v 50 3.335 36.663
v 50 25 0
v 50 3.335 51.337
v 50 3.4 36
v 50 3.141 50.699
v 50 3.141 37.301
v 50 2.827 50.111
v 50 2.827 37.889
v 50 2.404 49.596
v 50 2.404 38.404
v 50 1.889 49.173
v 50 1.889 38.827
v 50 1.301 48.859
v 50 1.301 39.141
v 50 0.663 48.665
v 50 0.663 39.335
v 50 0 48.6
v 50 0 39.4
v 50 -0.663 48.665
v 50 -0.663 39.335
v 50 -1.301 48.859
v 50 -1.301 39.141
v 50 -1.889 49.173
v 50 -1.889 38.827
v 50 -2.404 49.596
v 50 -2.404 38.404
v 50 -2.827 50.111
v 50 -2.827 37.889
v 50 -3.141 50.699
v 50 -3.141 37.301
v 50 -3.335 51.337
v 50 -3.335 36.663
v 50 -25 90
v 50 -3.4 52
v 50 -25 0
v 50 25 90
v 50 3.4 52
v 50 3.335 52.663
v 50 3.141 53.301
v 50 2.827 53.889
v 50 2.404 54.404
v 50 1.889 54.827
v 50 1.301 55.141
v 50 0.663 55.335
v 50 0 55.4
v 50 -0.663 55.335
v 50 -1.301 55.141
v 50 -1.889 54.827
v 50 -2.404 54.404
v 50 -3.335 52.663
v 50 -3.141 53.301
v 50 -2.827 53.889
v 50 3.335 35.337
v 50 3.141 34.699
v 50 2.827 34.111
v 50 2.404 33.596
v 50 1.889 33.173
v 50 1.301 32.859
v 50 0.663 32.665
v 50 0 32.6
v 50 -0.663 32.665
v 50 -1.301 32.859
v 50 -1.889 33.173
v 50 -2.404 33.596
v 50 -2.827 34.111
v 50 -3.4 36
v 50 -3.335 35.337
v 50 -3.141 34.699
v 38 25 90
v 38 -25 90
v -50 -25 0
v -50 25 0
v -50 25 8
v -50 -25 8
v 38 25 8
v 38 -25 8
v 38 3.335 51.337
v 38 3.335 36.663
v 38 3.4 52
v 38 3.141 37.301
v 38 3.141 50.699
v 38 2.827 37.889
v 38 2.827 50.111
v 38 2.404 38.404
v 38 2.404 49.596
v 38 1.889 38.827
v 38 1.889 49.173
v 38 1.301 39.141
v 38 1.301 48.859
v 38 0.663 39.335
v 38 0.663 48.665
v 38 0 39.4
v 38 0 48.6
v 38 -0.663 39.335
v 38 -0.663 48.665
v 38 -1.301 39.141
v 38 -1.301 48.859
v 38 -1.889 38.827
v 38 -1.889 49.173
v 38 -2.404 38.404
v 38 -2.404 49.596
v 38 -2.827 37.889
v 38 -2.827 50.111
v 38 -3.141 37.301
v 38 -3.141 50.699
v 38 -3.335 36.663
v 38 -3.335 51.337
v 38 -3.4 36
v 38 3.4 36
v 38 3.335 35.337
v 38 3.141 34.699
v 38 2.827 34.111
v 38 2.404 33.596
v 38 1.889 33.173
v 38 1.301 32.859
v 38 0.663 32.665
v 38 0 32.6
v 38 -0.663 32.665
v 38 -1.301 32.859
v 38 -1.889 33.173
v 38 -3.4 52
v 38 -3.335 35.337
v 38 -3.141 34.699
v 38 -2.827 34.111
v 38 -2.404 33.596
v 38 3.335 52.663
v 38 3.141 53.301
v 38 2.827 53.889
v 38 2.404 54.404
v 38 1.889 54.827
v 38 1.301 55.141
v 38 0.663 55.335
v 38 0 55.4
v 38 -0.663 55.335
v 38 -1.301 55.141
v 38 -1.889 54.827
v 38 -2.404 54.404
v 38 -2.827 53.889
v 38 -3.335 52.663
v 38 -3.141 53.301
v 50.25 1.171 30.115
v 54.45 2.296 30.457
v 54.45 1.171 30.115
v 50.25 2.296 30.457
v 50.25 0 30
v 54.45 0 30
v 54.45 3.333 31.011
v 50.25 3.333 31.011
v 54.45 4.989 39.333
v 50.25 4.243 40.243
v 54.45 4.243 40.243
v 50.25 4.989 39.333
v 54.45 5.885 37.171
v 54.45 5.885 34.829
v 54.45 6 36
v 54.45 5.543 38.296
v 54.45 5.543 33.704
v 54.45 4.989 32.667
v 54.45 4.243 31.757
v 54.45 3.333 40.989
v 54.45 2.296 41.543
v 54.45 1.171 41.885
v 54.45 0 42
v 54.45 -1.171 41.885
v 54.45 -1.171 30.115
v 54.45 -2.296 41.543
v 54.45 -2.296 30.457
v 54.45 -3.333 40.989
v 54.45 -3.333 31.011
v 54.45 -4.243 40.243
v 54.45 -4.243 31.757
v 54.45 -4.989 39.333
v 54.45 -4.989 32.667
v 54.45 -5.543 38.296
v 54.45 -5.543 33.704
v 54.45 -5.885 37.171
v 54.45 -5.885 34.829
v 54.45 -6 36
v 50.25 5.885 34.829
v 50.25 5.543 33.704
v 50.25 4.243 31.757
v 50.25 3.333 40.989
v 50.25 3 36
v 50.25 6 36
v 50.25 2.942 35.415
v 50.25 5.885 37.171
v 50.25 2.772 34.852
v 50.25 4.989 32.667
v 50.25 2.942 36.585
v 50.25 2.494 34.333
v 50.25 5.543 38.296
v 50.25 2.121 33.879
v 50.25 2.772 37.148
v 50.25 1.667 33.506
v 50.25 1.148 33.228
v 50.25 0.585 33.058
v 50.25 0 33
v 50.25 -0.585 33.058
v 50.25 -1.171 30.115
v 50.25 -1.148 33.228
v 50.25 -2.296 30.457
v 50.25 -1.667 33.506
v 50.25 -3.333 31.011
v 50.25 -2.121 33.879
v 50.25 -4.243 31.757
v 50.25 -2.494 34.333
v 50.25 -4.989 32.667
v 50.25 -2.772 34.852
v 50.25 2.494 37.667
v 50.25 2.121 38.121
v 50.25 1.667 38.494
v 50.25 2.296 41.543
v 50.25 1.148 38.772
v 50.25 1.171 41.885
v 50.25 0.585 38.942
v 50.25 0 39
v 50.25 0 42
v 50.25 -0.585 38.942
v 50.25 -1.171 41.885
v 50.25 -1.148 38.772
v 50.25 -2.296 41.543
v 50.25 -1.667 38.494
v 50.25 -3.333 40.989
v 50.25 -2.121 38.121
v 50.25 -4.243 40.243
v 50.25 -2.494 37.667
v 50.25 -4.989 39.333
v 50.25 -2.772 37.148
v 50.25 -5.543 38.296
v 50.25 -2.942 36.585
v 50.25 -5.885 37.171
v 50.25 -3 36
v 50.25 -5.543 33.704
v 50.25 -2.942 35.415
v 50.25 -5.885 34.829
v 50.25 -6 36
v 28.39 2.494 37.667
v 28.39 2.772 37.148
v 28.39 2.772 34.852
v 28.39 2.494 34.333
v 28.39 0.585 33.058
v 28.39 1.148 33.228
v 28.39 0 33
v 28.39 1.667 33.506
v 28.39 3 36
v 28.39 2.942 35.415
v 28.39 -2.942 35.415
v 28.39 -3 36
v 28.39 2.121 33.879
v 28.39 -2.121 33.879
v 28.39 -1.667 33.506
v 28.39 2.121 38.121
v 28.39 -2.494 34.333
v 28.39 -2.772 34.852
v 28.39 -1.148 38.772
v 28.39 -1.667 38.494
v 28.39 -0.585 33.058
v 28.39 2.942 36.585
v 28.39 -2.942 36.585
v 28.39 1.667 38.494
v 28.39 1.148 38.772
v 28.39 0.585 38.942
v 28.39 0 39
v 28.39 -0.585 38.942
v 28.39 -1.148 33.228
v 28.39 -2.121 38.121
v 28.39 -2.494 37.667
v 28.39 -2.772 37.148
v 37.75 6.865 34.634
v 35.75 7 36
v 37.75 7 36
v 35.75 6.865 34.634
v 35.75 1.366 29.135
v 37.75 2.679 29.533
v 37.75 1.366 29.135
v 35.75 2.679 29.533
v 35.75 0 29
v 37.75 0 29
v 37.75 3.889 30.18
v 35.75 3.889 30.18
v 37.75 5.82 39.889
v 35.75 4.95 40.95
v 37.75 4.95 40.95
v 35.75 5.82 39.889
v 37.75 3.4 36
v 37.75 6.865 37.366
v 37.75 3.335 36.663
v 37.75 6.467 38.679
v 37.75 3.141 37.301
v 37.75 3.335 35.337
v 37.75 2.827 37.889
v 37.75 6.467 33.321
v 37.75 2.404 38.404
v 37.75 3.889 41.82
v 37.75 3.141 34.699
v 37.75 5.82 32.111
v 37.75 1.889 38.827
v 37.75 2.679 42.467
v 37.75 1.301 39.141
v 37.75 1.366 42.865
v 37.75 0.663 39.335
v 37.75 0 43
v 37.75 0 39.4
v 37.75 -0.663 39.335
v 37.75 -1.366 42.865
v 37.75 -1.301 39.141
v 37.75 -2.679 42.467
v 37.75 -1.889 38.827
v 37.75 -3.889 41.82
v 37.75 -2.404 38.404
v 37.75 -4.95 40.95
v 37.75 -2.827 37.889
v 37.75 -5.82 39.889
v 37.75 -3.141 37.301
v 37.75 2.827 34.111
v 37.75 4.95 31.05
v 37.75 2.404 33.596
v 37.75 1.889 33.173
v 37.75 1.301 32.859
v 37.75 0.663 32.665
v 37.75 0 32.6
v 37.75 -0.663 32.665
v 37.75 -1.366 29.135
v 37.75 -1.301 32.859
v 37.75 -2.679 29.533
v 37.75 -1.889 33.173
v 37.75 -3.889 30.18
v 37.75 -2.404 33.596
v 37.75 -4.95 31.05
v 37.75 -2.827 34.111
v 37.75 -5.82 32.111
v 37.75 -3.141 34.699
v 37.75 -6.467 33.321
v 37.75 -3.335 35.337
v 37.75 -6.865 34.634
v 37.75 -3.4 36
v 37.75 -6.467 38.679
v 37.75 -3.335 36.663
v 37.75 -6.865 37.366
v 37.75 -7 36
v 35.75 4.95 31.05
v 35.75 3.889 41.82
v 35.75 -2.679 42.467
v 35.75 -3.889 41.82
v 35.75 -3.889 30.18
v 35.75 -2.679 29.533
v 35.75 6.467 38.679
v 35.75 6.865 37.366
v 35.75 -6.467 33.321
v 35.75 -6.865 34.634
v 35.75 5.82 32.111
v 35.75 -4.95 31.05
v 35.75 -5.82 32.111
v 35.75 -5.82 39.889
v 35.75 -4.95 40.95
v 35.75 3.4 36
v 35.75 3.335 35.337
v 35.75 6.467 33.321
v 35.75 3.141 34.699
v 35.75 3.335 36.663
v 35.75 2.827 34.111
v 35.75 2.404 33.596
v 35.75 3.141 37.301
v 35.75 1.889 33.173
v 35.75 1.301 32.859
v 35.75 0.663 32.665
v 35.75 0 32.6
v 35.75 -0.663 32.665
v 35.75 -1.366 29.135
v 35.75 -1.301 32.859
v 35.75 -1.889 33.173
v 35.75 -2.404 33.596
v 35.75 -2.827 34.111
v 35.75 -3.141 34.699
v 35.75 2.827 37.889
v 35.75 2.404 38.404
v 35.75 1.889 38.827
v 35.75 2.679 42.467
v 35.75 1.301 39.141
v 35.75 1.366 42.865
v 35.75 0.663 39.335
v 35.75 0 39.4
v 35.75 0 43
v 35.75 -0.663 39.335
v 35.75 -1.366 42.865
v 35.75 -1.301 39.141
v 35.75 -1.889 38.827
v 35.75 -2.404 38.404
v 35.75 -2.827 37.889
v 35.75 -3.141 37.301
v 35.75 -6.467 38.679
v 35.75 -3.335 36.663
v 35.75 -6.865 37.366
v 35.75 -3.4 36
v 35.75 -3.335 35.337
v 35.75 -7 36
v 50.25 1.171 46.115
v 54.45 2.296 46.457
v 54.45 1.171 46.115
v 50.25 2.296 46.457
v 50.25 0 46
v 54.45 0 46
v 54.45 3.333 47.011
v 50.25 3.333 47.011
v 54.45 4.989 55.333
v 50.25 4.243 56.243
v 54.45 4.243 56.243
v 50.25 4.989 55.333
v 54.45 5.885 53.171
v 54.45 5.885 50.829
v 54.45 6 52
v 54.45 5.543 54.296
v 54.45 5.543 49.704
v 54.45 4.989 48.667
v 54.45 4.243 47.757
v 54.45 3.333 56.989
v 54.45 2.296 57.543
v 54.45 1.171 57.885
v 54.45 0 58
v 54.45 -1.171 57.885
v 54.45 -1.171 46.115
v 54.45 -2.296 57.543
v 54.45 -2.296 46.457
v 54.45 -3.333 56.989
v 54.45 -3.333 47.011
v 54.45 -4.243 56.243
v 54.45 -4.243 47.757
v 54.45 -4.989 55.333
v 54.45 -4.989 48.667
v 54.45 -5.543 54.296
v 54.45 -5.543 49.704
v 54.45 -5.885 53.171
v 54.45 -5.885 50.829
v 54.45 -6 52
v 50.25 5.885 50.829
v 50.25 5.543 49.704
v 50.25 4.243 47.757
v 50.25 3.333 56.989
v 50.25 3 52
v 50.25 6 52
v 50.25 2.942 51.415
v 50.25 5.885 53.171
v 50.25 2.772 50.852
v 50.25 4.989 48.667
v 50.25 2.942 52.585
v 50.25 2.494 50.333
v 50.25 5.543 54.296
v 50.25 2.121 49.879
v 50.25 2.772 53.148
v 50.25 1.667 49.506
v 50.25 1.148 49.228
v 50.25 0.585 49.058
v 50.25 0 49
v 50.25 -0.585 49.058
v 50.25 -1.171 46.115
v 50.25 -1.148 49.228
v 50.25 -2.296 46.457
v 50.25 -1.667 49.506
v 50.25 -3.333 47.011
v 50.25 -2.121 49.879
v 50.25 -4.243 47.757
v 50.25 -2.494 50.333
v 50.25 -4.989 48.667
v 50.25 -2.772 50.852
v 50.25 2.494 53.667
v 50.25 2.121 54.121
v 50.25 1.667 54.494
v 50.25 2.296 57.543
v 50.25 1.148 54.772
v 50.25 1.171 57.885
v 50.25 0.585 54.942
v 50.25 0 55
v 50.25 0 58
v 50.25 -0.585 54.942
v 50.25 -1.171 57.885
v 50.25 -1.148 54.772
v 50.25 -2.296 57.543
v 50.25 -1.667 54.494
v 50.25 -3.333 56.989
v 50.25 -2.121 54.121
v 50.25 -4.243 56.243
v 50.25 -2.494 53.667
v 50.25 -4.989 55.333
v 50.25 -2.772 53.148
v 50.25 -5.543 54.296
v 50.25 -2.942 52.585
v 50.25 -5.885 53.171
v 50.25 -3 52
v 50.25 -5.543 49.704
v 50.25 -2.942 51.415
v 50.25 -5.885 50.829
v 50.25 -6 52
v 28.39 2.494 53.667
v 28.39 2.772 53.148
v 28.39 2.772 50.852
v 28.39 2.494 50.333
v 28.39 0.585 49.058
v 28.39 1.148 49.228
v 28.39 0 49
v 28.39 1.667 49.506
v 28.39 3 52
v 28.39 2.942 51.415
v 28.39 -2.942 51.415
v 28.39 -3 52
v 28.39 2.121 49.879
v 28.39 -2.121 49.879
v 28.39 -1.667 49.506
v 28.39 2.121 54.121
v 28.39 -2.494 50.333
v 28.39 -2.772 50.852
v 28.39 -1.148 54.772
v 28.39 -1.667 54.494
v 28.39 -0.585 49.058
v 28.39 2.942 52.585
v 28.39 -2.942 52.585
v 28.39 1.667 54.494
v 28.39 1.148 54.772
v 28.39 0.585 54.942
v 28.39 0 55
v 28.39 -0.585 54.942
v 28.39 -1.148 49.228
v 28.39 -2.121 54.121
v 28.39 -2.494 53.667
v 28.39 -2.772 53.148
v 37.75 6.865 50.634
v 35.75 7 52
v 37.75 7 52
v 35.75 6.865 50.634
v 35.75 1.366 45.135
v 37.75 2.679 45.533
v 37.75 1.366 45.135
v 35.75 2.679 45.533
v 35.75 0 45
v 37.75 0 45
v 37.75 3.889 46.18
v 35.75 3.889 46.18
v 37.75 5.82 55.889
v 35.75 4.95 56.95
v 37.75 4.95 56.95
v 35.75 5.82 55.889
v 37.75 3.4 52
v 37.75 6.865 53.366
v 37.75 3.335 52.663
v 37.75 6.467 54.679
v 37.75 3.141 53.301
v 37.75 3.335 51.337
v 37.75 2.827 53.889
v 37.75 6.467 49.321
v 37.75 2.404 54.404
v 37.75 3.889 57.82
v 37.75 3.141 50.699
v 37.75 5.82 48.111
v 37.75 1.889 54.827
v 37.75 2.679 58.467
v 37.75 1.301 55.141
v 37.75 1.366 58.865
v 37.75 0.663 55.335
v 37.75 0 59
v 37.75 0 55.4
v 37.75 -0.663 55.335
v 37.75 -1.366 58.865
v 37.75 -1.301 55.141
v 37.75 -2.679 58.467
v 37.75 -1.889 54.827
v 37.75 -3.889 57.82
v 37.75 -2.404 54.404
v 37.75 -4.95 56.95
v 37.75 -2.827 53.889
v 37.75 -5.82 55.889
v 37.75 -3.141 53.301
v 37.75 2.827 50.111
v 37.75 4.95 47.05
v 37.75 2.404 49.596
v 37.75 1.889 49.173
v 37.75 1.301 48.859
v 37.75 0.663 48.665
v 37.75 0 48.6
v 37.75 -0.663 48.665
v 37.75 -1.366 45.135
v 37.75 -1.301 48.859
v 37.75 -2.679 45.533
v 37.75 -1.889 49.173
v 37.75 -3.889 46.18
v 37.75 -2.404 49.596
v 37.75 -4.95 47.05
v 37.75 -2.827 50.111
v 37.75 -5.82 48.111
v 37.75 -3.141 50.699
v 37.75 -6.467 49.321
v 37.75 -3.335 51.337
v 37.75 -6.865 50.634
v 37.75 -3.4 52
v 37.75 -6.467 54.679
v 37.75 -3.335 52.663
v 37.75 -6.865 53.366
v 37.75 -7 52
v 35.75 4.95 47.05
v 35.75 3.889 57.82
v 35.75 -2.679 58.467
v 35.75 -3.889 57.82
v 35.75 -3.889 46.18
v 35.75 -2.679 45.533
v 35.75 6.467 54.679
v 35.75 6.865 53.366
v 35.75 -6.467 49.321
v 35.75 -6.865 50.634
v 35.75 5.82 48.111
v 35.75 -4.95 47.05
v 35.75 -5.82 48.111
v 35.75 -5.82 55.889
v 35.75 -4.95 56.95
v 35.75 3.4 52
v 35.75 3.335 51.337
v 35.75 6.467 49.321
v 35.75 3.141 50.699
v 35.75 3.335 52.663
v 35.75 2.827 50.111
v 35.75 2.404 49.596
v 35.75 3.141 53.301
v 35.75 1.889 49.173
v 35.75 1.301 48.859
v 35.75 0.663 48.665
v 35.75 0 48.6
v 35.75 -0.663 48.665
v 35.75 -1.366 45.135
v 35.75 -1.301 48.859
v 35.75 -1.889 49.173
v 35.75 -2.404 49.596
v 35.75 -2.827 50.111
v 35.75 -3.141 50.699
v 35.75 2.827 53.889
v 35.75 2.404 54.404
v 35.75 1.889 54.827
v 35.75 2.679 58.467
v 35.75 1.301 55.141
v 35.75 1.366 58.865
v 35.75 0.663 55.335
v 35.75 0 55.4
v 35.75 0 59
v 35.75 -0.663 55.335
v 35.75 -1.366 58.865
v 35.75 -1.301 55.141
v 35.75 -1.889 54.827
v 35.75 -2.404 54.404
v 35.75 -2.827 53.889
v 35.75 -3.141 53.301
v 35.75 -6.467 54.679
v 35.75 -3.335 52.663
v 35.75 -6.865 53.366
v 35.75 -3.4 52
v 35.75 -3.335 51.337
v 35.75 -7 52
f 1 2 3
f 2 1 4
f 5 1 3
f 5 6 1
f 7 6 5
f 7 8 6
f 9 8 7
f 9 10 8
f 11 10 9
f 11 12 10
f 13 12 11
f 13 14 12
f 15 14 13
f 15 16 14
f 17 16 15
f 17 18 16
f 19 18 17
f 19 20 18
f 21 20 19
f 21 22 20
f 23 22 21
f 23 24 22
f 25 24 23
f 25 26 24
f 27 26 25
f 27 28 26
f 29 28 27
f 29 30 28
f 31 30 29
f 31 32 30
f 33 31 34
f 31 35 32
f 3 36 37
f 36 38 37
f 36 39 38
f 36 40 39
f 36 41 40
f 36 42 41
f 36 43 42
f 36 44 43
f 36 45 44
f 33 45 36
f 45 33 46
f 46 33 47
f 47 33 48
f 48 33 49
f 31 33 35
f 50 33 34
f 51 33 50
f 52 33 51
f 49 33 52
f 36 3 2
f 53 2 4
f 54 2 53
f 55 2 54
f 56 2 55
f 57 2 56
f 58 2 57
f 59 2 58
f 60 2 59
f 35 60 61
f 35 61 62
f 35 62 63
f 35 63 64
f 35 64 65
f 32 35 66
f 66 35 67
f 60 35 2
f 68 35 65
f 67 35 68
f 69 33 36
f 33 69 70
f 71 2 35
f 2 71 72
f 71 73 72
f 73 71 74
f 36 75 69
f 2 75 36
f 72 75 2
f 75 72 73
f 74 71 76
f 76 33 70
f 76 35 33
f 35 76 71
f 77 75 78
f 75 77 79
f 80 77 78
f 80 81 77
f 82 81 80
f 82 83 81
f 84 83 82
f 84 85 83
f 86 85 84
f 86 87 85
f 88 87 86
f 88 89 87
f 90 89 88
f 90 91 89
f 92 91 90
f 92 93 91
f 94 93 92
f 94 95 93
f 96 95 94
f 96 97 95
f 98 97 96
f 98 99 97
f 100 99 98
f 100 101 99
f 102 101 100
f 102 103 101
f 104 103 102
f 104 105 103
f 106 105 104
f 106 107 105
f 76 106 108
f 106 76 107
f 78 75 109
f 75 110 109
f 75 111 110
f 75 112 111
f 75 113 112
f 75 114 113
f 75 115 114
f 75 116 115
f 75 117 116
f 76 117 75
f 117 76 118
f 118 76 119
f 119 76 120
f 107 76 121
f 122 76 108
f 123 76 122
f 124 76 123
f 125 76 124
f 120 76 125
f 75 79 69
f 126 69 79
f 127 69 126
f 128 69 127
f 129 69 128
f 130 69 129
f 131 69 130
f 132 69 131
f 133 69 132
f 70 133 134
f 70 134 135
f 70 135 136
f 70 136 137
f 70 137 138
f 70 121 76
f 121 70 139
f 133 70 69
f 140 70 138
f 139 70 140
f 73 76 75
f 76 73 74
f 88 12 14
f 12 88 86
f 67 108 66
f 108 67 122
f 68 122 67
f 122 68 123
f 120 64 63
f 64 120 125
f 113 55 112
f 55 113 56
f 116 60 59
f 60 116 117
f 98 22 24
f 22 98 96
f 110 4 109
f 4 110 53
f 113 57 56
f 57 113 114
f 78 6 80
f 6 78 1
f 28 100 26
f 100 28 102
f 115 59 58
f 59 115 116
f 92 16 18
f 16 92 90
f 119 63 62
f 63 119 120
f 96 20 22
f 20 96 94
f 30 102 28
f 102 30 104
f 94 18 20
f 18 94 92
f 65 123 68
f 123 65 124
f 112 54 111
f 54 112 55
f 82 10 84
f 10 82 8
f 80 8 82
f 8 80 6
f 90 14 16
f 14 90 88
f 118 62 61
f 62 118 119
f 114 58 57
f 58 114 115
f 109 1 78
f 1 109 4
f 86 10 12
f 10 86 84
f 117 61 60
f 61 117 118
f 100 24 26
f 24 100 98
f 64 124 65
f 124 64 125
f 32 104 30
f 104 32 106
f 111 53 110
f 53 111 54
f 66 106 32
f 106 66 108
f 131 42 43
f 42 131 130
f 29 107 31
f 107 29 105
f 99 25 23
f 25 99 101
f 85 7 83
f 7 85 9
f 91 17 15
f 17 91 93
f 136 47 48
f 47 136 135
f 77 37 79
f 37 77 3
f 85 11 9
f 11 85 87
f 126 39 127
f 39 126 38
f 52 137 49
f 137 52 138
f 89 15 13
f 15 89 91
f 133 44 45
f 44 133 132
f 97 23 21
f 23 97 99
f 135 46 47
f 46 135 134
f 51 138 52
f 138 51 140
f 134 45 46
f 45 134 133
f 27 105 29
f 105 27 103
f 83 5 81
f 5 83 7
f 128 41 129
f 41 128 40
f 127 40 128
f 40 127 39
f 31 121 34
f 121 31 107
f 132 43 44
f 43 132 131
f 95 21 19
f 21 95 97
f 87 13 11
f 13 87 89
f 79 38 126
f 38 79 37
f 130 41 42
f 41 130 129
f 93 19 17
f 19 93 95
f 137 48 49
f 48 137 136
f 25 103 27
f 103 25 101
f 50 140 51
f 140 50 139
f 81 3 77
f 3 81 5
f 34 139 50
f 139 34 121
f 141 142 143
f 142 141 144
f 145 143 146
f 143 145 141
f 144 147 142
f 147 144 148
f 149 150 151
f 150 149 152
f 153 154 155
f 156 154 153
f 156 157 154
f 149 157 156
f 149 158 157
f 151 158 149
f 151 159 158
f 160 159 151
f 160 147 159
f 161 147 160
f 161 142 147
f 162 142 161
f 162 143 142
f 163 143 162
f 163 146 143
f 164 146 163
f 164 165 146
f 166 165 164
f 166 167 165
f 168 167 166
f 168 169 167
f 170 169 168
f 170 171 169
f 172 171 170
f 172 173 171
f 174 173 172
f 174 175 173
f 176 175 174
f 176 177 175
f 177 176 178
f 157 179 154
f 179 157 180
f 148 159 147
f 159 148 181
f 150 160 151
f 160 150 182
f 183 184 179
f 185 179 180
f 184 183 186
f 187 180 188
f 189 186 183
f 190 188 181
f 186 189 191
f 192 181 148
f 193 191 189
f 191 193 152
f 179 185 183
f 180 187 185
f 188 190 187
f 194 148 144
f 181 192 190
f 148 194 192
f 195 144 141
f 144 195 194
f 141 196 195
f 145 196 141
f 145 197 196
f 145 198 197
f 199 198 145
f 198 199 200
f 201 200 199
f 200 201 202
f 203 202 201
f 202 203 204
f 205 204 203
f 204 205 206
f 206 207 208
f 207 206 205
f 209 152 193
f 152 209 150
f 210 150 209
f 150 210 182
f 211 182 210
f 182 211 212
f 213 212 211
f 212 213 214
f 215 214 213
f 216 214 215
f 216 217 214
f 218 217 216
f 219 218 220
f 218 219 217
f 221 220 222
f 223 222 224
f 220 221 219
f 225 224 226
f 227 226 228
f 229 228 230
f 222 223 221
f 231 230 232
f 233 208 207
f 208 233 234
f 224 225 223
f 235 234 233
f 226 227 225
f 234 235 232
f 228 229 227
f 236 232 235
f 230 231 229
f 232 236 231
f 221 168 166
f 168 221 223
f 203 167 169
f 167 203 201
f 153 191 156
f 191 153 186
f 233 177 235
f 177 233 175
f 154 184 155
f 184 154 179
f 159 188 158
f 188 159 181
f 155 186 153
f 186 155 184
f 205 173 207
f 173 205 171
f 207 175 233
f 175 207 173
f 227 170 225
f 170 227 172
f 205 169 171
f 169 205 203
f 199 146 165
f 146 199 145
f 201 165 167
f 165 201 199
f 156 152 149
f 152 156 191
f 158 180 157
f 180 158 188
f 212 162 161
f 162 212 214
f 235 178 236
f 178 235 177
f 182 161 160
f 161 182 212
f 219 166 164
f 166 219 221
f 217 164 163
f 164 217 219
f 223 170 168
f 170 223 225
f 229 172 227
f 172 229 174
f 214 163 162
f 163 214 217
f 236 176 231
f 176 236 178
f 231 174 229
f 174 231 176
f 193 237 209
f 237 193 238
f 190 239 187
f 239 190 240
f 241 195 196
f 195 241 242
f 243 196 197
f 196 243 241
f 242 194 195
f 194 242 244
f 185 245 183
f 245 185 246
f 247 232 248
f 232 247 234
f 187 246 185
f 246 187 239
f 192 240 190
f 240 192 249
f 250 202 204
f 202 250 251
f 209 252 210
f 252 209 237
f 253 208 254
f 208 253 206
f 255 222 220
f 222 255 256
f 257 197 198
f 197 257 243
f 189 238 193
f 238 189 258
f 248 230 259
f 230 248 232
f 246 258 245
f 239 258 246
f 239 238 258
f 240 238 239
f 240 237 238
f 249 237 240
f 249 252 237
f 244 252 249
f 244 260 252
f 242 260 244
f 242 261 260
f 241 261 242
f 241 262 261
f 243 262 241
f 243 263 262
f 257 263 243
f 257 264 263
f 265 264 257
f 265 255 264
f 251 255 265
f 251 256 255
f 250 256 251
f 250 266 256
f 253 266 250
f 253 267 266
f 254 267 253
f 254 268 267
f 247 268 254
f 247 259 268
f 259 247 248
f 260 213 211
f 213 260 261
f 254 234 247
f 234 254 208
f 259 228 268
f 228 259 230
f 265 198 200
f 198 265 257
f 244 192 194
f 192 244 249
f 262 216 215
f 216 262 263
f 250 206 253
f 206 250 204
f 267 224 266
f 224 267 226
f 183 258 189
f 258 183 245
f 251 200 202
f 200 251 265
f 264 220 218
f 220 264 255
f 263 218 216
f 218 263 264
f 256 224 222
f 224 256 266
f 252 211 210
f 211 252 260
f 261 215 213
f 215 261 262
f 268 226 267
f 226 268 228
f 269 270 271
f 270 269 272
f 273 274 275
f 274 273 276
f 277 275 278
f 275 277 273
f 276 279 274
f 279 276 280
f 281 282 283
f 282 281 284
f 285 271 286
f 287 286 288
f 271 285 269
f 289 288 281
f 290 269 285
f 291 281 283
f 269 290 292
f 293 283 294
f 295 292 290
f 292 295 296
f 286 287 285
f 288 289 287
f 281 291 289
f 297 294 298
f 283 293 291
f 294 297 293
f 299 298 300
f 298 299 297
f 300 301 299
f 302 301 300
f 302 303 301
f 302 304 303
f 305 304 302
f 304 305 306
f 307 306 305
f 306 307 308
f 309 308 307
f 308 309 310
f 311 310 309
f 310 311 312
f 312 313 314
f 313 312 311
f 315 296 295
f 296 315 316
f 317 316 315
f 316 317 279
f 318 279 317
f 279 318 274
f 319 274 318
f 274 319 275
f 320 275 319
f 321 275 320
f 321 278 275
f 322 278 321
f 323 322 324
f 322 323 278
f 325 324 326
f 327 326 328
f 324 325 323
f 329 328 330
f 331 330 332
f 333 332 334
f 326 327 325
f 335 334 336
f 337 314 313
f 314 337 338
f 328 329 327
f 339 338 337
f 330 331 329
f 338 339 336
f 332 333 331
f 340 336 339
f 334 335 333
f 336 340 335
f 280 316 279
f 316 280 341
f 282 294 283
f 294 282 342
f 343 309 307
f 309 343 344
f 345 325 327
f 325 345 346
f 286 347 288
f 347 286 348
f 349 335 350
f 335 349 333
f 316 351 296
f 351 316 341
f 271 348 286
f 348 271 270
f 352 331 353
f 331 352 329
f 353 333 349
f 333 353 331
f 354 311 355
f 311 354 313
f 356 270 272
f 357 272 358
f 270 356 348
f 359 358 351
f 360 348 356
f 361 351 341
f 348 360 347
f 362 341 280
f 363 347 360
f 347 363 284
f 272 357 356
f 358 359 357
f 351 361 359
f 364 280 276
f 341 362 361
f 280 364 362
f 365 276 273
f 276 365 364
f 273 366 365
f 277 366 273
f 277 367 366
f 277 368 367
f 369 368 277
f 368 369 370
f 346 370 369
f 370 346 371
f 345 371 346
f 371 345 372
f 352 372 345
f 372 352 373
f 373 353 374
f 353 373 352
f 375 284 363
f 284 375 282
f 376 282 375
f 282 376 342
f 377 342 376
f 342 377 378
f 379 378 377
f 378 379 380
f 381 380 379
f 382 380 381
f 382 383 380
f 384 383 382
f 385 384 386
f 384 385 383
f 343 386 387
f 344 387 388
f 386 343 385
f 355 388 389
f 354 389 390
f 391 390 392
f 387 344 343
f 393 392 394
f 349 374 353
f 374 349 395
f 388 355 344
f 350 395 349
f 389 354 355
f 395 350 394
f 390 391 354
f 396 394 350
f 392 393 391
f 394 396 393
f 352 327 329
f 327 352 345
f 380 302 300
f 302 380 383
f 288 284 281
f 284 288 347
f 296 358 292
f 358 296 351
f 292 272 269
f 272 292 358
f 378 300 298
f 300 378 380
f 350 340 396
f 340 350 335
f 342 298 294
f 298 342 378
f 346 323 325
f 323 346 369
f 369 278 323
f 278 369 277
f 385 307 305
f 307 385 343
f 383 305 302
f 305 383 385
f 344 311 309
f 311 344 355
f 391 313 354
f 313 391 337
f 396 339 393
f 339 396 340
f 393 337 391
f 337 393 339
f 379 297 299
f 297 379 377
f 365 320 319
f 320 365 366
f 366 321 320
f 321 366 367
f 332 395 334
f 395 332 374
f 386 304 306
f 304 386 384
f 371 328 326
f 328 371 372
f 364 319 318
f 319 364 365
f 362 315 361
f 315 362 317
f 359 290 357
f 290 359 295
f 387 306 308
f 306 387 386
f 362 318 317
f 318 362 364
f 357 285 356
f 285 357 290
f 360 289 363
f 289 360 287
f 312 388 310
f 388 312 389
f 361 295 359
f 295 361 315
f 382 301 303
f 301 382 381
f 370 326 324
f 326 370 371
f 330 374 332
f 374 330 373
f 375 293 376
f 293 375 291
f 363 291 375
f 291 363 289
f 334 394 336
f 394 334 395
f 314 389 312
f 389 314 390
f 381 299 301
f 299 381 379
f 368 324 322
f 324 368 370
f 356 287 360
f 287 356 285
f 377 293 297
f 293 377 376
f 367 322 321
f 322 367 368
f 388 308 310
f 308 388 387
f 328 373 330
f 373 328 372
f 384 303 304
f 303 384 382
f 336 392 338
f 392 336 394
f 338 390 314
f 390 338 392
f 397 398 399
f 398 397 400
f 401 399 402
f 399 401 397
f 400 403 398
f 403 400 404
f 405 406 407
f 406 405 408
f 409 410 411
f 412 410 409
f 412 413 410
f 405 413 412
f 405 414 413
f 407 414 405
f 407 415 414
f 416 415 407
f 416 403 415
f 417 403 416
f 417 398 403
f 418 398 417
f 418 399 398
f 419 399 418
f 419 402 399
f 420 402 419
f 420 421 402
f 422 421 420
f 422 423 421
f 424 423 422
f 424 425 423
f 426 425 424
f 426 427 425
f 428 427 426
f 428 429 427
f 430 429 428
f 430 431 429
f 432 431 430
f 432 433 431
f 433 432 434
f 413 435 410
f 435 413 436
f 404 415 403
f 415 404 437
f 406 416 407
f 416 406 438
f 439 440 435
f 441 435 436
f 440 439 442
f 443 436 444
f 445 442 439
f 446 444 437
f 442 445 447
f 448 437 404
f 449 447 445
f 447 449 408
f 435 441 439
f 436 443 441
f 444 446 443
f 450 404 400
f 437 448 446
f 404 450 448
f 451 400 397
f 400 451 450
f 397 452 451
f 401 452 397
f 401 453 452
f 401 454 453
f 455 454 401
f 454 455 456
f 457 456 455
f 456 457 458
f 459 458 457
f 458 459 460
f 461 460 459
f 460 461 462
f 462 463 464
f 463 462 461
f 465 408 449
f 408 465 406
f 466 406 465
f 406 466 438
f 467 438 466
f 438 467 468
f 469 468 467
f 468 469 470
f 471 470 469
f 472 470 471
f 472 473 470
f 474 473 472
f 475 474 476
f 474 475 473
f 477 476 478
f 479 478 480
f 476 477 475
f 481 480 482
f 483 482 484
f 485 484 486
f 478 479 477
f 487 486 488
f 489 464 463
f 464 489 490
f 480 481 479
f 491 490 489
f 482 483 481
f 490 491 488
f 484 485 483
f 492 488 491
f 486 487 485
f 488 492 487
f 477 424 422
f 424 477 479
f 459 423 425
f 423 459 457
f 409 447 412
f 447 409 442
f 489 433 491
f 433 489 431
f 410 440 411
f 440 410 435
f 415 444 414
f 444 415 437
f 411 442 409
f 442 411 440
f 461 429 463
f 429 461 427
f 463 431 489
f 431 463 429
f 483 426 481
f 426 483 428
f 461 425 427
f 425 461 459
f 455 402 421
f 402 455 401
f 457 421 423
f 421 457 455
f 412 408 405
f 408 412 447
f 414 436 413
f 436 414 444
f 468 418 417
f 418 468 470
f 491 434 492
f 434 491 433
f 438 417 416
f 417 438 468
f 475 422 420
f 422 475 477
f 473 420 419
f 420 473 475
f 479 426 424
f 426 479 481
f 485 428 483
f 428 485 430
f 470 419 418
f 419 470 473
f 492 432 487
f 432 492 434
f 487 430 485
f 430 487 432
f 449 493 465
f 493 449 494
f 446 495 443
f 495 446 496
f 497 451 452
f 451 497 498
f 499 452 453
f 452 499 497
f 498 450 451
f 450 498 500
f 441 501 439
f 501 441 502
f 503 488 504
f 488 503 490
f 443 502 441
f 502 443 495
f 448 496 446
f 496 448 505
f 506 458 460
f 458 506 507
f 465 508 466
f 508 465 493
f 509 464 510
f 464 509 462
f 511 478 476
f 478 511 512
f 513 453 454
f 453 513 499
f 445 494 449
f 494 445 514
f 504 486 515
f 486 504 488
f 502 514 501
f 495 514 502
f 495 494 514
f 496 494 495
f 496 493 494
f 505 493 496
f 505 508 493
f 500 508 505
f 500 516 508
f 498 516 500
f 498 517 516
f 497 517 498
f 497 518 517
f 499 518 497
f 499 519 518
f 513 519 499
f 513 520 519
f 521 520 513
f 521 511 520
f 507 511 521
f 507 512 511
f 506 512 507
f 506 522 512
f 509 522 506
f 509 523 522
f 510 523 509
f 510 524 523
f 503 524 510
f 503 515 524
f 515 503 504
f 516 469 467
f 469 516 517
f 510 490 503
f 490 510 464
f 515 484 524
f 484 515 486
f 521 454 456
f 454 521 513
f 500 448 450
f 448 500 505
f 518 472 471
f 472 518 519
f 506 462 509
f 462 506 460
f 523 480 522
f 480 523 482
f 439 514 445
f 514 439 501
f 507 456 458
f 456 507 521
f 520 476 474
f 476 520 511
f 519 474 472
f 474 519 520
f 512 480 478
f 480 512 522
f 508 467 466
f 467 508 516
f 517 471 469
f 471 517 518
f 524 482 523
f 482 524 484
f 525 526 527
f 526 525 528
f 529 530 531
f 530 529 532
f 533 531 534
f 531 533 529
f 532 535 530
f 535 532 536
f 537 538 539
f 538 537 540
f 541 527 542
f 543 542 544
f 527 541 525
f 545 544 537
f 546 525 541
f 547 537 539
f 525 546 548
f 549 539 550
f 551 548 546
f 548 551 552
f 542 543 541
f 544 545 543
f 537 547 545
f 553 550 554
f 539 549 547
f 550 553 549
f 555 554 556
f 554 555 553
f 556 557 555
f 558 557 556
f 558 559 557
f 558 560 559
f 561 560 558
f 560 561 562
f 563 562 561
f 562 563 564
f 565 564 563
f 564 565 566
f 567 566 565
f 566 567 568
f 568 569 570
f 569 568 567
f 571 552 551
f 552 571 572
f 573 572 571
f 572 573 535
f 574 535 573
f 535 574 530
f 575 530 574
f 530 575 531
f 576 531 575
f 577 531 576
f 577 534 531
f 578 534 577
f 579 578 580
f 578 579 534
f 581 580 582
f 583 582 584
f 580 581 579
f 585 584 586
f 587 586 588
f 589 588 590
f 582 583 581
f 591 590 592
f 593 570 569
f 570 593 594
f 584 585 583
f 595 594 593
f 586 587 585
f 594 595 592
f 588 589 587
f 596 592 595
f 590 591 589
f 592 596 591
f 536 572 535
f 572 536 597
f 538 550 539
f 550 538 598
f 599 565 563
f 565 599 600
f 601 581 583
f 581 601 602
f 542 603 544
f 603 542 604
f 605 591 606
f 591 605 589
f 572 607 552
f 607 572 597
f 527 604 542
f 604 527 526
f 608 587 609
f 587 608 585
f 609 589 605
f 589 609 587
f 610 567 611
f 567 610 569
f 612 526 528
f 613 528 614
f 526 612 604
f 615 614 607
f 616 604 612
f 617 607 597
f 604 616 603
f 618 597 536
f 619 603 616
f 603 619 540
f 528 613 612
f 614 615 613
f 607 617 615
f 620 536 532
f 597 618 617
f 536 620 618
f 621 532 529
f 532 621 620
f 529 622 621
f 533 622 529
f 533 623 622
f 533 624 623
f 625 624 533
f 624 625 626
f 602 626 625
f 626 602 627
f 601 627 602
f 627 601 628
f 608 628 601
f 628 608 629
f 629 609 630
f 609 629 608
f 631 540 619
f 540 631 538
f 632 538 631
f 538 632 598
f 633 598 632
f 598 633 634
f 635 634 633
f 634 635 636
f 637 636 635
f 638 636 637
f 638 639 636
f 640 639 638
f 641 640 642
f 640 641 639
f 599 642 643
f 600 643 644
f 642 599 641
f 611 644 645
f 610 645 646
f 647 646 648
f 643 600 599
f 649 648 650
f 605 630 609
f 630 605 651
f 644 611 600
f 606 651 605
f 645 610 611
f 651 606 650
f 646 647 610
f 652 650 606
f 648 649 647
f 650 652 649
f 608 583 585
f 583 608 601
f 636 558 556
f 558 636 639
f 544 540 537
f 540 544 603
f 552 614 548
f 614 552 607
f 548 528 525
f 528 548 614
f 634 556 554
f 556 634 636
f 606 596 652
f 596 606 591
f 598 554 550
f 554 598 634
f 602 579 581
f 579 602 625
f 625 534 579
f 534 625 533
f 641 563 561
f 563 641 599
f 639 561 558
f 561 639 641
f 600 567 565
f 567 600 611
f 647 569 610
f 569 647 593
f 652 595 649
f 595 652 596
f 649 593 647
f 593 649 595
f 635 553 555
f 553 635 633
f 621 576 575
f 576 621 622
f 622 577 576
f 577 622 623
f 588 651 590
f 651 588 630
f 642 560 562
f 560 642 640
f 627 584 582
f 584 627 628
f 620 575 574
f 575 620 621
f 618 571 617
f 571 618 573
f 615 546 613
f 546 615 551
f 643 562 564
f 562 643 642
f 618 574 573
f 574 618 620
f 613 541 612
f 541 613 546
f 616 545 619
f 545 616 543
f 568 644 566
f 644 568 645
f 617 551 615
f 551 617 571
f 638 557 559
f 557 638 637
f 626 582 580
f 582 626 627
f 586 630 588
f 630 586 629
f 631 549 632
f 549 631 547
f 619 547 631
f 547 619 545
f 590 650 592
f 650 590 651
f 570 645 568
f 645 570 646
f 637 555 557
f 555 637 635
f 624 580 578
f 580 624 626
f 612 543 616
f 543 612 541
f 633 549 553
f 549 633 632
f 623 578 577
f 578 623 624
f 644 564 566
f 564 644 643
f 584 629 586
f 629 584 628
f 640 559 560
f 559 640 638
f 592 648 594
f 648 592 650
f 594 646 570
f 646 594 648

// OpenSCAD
$fn = 32;

// ------------------------------------------------------------------------
// Bolted bracket: 100 x 50 mm bracket with 2 bolt joints
// Every part is its own module, assembly() places them once.
// ------------------------------------------------------------------------

// --- part 1 ---
module bracket() {
  difference() {
    translate([-50, -25, 0]) cube([100, 50, 90]);
    translate([-51, -26, 8]) cube([89, 52, 83]);
    translate([44, 0, 36]) rotate([0, 90, 0]) cylinder(h = 14, d = 6.8, center = true);
    translate([44, 0, 52]) rotate([0, 90, 0]) cylinder(h = 14, d = 6.8, center = true);
  }
}

// --- part 2 ---
module bolt1() {
  cylinder(h = 4.2, d = 12);
  translate([0, 0, -21.86]) cylinder(h = 21.86, d = 6);
}

// --- part 3 ---
module washer1() {
  difference() {
      translate([0, 0, 0]) cylinder(h = 2, d = 14);
      translate([0, 0, -1]) cylinder(h = 4, d = 6.8);
    }
}

// --- part 4 ---
module bolt2() {
  cylinder(h = 4.2, d = 12);
  translate([0, 0, -21.86]) cylinder(h = 21.86, d = 6);
}

// --- part 5 ---
module washer2() {
  difference() {
      translate([0, 0, 0]) cylinder(h = 2, d = 14);
      translate([0, 0, -1]) cylinder(h = 4, d = 6.8);
    }
}

// --- assembly ---
module assembly() {
  translate([0, 0, 0]) rotate([0, 0, 0]) bracket();
  translate([50.25, 0, 36]) rotate([0, 90, 0]) bolt1();
  translate([35.75, 0, 36]) rotate([0, 90, 0]) washer1();
  translate([50.25, 0, 52]) rotate([0, 90, 0]) bolt2();
  translate([35.75, 0, 52]) rotate([0, 90, 0]) washer2();
}

assembly();
